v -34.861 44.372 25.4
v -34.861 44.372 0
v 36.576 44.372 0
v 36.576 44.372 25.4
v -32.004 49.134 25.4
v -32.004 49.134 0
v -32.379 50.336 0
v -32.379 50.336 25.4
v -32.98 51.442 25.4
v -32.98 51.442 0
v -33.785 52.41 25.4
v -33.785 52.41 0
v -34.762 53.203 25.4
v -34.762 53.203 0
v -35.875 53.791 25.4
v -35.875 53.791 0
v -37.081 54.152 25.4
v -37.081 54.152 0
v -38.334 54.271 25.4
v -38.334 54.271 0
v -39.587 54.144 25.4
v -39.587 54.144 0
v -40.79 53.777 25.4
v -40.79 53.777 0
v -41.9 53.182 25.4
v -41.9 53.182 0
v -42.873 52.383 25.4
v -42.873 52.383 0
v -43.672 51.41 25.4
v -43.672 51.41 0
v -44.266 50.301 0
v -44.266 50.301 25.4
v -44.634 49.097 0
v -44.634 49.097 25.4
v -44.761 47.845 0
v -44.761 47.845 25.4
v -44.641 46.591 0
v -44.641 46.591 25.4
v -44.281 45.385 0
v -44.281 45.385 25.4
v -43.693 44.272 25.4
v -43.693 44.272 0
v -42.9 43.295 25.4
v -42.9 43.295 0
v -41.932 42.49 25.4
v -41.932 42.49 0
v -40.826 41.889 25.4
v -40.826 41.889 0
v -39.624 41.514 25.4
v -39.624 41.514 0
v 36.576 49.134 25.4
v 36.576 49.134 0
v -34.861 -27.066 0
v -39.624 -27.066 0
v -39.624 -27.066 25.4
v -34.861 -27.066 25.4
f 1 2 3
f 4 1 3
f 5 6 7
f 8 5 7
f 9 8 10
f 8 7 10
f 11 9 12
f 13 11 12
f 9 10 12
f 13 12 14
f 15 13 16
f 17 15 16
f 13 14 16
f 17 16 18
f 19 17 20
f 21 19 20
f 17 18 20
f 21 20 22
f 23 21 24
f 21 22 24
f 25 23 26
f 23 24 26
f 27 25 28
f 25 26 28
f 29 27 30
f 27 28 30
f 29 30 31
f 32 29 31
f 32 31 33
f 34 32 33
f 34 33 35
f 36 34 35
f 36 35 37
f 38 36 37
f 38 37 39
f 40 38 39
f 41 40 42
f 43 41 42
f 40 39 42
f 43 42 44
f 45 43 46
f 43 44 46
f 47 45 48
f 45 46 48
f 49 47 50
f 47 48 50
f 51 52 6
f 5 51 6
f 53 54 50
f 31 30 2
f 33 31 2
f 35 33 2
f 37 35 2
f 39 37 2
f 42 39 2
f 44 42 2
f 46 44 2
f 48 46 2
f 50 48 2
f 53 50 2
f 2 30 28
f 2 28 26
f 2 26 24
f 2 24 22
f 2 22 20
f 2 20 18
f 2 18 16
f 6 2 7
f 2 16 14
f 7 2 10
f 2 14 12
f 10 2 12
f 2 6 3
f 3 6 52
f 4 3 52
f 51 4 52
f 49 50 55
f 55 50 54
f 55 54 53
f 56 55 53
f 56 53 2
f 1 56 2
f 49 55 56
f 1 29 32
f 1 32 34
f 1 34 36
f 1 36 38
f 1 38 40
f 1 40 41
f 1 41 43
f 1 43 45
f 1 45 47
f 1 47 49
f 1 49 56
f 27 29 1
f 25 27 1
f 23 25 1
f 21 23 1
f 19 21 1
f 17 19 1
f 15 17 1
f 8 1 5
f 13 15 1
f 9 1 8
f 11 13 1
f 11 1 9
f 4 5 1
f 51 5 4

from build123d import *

# Parameters (mm, degrees)
F1_DEPTH = 25.4


# Not quite as in the source:
# - a feature names something its author has since deleted; it is built from what else it names


with BuildPart() as f1:
    # F0 (on Top) → F1 (new body)
    with BuildSketch(Plane.XY):
        Polygon((-32.0039994973, 49.1343741807), (-39.6239994973, 49.1343741807), (-39.6239994973, 41.5143741807), (-39.6239994973, -27.0656258193), (-34.8614994973, -27.0656258193), (-34.8614994973, 44.3718741807), (36.5760005027, 44.3718741807), (36.5760005027, 49.1343741807), align=None)
        with BuildLine():
            Line((-39.6239994973, 41.5143741807), (-39.6239994973, 49.1343741807))
            Line((-39.6239994973, 49.1343741807), (-32.0039994973, 49.1343741807))
            ThreePointArc((-32.0039994973, 49.1343741807), (-42.8727293035, 52.3831039869), (-39.6239994973, 41.5143741807))
        make_face()
    extrude(amount=F1_DEPTH)


solid = f1.part
